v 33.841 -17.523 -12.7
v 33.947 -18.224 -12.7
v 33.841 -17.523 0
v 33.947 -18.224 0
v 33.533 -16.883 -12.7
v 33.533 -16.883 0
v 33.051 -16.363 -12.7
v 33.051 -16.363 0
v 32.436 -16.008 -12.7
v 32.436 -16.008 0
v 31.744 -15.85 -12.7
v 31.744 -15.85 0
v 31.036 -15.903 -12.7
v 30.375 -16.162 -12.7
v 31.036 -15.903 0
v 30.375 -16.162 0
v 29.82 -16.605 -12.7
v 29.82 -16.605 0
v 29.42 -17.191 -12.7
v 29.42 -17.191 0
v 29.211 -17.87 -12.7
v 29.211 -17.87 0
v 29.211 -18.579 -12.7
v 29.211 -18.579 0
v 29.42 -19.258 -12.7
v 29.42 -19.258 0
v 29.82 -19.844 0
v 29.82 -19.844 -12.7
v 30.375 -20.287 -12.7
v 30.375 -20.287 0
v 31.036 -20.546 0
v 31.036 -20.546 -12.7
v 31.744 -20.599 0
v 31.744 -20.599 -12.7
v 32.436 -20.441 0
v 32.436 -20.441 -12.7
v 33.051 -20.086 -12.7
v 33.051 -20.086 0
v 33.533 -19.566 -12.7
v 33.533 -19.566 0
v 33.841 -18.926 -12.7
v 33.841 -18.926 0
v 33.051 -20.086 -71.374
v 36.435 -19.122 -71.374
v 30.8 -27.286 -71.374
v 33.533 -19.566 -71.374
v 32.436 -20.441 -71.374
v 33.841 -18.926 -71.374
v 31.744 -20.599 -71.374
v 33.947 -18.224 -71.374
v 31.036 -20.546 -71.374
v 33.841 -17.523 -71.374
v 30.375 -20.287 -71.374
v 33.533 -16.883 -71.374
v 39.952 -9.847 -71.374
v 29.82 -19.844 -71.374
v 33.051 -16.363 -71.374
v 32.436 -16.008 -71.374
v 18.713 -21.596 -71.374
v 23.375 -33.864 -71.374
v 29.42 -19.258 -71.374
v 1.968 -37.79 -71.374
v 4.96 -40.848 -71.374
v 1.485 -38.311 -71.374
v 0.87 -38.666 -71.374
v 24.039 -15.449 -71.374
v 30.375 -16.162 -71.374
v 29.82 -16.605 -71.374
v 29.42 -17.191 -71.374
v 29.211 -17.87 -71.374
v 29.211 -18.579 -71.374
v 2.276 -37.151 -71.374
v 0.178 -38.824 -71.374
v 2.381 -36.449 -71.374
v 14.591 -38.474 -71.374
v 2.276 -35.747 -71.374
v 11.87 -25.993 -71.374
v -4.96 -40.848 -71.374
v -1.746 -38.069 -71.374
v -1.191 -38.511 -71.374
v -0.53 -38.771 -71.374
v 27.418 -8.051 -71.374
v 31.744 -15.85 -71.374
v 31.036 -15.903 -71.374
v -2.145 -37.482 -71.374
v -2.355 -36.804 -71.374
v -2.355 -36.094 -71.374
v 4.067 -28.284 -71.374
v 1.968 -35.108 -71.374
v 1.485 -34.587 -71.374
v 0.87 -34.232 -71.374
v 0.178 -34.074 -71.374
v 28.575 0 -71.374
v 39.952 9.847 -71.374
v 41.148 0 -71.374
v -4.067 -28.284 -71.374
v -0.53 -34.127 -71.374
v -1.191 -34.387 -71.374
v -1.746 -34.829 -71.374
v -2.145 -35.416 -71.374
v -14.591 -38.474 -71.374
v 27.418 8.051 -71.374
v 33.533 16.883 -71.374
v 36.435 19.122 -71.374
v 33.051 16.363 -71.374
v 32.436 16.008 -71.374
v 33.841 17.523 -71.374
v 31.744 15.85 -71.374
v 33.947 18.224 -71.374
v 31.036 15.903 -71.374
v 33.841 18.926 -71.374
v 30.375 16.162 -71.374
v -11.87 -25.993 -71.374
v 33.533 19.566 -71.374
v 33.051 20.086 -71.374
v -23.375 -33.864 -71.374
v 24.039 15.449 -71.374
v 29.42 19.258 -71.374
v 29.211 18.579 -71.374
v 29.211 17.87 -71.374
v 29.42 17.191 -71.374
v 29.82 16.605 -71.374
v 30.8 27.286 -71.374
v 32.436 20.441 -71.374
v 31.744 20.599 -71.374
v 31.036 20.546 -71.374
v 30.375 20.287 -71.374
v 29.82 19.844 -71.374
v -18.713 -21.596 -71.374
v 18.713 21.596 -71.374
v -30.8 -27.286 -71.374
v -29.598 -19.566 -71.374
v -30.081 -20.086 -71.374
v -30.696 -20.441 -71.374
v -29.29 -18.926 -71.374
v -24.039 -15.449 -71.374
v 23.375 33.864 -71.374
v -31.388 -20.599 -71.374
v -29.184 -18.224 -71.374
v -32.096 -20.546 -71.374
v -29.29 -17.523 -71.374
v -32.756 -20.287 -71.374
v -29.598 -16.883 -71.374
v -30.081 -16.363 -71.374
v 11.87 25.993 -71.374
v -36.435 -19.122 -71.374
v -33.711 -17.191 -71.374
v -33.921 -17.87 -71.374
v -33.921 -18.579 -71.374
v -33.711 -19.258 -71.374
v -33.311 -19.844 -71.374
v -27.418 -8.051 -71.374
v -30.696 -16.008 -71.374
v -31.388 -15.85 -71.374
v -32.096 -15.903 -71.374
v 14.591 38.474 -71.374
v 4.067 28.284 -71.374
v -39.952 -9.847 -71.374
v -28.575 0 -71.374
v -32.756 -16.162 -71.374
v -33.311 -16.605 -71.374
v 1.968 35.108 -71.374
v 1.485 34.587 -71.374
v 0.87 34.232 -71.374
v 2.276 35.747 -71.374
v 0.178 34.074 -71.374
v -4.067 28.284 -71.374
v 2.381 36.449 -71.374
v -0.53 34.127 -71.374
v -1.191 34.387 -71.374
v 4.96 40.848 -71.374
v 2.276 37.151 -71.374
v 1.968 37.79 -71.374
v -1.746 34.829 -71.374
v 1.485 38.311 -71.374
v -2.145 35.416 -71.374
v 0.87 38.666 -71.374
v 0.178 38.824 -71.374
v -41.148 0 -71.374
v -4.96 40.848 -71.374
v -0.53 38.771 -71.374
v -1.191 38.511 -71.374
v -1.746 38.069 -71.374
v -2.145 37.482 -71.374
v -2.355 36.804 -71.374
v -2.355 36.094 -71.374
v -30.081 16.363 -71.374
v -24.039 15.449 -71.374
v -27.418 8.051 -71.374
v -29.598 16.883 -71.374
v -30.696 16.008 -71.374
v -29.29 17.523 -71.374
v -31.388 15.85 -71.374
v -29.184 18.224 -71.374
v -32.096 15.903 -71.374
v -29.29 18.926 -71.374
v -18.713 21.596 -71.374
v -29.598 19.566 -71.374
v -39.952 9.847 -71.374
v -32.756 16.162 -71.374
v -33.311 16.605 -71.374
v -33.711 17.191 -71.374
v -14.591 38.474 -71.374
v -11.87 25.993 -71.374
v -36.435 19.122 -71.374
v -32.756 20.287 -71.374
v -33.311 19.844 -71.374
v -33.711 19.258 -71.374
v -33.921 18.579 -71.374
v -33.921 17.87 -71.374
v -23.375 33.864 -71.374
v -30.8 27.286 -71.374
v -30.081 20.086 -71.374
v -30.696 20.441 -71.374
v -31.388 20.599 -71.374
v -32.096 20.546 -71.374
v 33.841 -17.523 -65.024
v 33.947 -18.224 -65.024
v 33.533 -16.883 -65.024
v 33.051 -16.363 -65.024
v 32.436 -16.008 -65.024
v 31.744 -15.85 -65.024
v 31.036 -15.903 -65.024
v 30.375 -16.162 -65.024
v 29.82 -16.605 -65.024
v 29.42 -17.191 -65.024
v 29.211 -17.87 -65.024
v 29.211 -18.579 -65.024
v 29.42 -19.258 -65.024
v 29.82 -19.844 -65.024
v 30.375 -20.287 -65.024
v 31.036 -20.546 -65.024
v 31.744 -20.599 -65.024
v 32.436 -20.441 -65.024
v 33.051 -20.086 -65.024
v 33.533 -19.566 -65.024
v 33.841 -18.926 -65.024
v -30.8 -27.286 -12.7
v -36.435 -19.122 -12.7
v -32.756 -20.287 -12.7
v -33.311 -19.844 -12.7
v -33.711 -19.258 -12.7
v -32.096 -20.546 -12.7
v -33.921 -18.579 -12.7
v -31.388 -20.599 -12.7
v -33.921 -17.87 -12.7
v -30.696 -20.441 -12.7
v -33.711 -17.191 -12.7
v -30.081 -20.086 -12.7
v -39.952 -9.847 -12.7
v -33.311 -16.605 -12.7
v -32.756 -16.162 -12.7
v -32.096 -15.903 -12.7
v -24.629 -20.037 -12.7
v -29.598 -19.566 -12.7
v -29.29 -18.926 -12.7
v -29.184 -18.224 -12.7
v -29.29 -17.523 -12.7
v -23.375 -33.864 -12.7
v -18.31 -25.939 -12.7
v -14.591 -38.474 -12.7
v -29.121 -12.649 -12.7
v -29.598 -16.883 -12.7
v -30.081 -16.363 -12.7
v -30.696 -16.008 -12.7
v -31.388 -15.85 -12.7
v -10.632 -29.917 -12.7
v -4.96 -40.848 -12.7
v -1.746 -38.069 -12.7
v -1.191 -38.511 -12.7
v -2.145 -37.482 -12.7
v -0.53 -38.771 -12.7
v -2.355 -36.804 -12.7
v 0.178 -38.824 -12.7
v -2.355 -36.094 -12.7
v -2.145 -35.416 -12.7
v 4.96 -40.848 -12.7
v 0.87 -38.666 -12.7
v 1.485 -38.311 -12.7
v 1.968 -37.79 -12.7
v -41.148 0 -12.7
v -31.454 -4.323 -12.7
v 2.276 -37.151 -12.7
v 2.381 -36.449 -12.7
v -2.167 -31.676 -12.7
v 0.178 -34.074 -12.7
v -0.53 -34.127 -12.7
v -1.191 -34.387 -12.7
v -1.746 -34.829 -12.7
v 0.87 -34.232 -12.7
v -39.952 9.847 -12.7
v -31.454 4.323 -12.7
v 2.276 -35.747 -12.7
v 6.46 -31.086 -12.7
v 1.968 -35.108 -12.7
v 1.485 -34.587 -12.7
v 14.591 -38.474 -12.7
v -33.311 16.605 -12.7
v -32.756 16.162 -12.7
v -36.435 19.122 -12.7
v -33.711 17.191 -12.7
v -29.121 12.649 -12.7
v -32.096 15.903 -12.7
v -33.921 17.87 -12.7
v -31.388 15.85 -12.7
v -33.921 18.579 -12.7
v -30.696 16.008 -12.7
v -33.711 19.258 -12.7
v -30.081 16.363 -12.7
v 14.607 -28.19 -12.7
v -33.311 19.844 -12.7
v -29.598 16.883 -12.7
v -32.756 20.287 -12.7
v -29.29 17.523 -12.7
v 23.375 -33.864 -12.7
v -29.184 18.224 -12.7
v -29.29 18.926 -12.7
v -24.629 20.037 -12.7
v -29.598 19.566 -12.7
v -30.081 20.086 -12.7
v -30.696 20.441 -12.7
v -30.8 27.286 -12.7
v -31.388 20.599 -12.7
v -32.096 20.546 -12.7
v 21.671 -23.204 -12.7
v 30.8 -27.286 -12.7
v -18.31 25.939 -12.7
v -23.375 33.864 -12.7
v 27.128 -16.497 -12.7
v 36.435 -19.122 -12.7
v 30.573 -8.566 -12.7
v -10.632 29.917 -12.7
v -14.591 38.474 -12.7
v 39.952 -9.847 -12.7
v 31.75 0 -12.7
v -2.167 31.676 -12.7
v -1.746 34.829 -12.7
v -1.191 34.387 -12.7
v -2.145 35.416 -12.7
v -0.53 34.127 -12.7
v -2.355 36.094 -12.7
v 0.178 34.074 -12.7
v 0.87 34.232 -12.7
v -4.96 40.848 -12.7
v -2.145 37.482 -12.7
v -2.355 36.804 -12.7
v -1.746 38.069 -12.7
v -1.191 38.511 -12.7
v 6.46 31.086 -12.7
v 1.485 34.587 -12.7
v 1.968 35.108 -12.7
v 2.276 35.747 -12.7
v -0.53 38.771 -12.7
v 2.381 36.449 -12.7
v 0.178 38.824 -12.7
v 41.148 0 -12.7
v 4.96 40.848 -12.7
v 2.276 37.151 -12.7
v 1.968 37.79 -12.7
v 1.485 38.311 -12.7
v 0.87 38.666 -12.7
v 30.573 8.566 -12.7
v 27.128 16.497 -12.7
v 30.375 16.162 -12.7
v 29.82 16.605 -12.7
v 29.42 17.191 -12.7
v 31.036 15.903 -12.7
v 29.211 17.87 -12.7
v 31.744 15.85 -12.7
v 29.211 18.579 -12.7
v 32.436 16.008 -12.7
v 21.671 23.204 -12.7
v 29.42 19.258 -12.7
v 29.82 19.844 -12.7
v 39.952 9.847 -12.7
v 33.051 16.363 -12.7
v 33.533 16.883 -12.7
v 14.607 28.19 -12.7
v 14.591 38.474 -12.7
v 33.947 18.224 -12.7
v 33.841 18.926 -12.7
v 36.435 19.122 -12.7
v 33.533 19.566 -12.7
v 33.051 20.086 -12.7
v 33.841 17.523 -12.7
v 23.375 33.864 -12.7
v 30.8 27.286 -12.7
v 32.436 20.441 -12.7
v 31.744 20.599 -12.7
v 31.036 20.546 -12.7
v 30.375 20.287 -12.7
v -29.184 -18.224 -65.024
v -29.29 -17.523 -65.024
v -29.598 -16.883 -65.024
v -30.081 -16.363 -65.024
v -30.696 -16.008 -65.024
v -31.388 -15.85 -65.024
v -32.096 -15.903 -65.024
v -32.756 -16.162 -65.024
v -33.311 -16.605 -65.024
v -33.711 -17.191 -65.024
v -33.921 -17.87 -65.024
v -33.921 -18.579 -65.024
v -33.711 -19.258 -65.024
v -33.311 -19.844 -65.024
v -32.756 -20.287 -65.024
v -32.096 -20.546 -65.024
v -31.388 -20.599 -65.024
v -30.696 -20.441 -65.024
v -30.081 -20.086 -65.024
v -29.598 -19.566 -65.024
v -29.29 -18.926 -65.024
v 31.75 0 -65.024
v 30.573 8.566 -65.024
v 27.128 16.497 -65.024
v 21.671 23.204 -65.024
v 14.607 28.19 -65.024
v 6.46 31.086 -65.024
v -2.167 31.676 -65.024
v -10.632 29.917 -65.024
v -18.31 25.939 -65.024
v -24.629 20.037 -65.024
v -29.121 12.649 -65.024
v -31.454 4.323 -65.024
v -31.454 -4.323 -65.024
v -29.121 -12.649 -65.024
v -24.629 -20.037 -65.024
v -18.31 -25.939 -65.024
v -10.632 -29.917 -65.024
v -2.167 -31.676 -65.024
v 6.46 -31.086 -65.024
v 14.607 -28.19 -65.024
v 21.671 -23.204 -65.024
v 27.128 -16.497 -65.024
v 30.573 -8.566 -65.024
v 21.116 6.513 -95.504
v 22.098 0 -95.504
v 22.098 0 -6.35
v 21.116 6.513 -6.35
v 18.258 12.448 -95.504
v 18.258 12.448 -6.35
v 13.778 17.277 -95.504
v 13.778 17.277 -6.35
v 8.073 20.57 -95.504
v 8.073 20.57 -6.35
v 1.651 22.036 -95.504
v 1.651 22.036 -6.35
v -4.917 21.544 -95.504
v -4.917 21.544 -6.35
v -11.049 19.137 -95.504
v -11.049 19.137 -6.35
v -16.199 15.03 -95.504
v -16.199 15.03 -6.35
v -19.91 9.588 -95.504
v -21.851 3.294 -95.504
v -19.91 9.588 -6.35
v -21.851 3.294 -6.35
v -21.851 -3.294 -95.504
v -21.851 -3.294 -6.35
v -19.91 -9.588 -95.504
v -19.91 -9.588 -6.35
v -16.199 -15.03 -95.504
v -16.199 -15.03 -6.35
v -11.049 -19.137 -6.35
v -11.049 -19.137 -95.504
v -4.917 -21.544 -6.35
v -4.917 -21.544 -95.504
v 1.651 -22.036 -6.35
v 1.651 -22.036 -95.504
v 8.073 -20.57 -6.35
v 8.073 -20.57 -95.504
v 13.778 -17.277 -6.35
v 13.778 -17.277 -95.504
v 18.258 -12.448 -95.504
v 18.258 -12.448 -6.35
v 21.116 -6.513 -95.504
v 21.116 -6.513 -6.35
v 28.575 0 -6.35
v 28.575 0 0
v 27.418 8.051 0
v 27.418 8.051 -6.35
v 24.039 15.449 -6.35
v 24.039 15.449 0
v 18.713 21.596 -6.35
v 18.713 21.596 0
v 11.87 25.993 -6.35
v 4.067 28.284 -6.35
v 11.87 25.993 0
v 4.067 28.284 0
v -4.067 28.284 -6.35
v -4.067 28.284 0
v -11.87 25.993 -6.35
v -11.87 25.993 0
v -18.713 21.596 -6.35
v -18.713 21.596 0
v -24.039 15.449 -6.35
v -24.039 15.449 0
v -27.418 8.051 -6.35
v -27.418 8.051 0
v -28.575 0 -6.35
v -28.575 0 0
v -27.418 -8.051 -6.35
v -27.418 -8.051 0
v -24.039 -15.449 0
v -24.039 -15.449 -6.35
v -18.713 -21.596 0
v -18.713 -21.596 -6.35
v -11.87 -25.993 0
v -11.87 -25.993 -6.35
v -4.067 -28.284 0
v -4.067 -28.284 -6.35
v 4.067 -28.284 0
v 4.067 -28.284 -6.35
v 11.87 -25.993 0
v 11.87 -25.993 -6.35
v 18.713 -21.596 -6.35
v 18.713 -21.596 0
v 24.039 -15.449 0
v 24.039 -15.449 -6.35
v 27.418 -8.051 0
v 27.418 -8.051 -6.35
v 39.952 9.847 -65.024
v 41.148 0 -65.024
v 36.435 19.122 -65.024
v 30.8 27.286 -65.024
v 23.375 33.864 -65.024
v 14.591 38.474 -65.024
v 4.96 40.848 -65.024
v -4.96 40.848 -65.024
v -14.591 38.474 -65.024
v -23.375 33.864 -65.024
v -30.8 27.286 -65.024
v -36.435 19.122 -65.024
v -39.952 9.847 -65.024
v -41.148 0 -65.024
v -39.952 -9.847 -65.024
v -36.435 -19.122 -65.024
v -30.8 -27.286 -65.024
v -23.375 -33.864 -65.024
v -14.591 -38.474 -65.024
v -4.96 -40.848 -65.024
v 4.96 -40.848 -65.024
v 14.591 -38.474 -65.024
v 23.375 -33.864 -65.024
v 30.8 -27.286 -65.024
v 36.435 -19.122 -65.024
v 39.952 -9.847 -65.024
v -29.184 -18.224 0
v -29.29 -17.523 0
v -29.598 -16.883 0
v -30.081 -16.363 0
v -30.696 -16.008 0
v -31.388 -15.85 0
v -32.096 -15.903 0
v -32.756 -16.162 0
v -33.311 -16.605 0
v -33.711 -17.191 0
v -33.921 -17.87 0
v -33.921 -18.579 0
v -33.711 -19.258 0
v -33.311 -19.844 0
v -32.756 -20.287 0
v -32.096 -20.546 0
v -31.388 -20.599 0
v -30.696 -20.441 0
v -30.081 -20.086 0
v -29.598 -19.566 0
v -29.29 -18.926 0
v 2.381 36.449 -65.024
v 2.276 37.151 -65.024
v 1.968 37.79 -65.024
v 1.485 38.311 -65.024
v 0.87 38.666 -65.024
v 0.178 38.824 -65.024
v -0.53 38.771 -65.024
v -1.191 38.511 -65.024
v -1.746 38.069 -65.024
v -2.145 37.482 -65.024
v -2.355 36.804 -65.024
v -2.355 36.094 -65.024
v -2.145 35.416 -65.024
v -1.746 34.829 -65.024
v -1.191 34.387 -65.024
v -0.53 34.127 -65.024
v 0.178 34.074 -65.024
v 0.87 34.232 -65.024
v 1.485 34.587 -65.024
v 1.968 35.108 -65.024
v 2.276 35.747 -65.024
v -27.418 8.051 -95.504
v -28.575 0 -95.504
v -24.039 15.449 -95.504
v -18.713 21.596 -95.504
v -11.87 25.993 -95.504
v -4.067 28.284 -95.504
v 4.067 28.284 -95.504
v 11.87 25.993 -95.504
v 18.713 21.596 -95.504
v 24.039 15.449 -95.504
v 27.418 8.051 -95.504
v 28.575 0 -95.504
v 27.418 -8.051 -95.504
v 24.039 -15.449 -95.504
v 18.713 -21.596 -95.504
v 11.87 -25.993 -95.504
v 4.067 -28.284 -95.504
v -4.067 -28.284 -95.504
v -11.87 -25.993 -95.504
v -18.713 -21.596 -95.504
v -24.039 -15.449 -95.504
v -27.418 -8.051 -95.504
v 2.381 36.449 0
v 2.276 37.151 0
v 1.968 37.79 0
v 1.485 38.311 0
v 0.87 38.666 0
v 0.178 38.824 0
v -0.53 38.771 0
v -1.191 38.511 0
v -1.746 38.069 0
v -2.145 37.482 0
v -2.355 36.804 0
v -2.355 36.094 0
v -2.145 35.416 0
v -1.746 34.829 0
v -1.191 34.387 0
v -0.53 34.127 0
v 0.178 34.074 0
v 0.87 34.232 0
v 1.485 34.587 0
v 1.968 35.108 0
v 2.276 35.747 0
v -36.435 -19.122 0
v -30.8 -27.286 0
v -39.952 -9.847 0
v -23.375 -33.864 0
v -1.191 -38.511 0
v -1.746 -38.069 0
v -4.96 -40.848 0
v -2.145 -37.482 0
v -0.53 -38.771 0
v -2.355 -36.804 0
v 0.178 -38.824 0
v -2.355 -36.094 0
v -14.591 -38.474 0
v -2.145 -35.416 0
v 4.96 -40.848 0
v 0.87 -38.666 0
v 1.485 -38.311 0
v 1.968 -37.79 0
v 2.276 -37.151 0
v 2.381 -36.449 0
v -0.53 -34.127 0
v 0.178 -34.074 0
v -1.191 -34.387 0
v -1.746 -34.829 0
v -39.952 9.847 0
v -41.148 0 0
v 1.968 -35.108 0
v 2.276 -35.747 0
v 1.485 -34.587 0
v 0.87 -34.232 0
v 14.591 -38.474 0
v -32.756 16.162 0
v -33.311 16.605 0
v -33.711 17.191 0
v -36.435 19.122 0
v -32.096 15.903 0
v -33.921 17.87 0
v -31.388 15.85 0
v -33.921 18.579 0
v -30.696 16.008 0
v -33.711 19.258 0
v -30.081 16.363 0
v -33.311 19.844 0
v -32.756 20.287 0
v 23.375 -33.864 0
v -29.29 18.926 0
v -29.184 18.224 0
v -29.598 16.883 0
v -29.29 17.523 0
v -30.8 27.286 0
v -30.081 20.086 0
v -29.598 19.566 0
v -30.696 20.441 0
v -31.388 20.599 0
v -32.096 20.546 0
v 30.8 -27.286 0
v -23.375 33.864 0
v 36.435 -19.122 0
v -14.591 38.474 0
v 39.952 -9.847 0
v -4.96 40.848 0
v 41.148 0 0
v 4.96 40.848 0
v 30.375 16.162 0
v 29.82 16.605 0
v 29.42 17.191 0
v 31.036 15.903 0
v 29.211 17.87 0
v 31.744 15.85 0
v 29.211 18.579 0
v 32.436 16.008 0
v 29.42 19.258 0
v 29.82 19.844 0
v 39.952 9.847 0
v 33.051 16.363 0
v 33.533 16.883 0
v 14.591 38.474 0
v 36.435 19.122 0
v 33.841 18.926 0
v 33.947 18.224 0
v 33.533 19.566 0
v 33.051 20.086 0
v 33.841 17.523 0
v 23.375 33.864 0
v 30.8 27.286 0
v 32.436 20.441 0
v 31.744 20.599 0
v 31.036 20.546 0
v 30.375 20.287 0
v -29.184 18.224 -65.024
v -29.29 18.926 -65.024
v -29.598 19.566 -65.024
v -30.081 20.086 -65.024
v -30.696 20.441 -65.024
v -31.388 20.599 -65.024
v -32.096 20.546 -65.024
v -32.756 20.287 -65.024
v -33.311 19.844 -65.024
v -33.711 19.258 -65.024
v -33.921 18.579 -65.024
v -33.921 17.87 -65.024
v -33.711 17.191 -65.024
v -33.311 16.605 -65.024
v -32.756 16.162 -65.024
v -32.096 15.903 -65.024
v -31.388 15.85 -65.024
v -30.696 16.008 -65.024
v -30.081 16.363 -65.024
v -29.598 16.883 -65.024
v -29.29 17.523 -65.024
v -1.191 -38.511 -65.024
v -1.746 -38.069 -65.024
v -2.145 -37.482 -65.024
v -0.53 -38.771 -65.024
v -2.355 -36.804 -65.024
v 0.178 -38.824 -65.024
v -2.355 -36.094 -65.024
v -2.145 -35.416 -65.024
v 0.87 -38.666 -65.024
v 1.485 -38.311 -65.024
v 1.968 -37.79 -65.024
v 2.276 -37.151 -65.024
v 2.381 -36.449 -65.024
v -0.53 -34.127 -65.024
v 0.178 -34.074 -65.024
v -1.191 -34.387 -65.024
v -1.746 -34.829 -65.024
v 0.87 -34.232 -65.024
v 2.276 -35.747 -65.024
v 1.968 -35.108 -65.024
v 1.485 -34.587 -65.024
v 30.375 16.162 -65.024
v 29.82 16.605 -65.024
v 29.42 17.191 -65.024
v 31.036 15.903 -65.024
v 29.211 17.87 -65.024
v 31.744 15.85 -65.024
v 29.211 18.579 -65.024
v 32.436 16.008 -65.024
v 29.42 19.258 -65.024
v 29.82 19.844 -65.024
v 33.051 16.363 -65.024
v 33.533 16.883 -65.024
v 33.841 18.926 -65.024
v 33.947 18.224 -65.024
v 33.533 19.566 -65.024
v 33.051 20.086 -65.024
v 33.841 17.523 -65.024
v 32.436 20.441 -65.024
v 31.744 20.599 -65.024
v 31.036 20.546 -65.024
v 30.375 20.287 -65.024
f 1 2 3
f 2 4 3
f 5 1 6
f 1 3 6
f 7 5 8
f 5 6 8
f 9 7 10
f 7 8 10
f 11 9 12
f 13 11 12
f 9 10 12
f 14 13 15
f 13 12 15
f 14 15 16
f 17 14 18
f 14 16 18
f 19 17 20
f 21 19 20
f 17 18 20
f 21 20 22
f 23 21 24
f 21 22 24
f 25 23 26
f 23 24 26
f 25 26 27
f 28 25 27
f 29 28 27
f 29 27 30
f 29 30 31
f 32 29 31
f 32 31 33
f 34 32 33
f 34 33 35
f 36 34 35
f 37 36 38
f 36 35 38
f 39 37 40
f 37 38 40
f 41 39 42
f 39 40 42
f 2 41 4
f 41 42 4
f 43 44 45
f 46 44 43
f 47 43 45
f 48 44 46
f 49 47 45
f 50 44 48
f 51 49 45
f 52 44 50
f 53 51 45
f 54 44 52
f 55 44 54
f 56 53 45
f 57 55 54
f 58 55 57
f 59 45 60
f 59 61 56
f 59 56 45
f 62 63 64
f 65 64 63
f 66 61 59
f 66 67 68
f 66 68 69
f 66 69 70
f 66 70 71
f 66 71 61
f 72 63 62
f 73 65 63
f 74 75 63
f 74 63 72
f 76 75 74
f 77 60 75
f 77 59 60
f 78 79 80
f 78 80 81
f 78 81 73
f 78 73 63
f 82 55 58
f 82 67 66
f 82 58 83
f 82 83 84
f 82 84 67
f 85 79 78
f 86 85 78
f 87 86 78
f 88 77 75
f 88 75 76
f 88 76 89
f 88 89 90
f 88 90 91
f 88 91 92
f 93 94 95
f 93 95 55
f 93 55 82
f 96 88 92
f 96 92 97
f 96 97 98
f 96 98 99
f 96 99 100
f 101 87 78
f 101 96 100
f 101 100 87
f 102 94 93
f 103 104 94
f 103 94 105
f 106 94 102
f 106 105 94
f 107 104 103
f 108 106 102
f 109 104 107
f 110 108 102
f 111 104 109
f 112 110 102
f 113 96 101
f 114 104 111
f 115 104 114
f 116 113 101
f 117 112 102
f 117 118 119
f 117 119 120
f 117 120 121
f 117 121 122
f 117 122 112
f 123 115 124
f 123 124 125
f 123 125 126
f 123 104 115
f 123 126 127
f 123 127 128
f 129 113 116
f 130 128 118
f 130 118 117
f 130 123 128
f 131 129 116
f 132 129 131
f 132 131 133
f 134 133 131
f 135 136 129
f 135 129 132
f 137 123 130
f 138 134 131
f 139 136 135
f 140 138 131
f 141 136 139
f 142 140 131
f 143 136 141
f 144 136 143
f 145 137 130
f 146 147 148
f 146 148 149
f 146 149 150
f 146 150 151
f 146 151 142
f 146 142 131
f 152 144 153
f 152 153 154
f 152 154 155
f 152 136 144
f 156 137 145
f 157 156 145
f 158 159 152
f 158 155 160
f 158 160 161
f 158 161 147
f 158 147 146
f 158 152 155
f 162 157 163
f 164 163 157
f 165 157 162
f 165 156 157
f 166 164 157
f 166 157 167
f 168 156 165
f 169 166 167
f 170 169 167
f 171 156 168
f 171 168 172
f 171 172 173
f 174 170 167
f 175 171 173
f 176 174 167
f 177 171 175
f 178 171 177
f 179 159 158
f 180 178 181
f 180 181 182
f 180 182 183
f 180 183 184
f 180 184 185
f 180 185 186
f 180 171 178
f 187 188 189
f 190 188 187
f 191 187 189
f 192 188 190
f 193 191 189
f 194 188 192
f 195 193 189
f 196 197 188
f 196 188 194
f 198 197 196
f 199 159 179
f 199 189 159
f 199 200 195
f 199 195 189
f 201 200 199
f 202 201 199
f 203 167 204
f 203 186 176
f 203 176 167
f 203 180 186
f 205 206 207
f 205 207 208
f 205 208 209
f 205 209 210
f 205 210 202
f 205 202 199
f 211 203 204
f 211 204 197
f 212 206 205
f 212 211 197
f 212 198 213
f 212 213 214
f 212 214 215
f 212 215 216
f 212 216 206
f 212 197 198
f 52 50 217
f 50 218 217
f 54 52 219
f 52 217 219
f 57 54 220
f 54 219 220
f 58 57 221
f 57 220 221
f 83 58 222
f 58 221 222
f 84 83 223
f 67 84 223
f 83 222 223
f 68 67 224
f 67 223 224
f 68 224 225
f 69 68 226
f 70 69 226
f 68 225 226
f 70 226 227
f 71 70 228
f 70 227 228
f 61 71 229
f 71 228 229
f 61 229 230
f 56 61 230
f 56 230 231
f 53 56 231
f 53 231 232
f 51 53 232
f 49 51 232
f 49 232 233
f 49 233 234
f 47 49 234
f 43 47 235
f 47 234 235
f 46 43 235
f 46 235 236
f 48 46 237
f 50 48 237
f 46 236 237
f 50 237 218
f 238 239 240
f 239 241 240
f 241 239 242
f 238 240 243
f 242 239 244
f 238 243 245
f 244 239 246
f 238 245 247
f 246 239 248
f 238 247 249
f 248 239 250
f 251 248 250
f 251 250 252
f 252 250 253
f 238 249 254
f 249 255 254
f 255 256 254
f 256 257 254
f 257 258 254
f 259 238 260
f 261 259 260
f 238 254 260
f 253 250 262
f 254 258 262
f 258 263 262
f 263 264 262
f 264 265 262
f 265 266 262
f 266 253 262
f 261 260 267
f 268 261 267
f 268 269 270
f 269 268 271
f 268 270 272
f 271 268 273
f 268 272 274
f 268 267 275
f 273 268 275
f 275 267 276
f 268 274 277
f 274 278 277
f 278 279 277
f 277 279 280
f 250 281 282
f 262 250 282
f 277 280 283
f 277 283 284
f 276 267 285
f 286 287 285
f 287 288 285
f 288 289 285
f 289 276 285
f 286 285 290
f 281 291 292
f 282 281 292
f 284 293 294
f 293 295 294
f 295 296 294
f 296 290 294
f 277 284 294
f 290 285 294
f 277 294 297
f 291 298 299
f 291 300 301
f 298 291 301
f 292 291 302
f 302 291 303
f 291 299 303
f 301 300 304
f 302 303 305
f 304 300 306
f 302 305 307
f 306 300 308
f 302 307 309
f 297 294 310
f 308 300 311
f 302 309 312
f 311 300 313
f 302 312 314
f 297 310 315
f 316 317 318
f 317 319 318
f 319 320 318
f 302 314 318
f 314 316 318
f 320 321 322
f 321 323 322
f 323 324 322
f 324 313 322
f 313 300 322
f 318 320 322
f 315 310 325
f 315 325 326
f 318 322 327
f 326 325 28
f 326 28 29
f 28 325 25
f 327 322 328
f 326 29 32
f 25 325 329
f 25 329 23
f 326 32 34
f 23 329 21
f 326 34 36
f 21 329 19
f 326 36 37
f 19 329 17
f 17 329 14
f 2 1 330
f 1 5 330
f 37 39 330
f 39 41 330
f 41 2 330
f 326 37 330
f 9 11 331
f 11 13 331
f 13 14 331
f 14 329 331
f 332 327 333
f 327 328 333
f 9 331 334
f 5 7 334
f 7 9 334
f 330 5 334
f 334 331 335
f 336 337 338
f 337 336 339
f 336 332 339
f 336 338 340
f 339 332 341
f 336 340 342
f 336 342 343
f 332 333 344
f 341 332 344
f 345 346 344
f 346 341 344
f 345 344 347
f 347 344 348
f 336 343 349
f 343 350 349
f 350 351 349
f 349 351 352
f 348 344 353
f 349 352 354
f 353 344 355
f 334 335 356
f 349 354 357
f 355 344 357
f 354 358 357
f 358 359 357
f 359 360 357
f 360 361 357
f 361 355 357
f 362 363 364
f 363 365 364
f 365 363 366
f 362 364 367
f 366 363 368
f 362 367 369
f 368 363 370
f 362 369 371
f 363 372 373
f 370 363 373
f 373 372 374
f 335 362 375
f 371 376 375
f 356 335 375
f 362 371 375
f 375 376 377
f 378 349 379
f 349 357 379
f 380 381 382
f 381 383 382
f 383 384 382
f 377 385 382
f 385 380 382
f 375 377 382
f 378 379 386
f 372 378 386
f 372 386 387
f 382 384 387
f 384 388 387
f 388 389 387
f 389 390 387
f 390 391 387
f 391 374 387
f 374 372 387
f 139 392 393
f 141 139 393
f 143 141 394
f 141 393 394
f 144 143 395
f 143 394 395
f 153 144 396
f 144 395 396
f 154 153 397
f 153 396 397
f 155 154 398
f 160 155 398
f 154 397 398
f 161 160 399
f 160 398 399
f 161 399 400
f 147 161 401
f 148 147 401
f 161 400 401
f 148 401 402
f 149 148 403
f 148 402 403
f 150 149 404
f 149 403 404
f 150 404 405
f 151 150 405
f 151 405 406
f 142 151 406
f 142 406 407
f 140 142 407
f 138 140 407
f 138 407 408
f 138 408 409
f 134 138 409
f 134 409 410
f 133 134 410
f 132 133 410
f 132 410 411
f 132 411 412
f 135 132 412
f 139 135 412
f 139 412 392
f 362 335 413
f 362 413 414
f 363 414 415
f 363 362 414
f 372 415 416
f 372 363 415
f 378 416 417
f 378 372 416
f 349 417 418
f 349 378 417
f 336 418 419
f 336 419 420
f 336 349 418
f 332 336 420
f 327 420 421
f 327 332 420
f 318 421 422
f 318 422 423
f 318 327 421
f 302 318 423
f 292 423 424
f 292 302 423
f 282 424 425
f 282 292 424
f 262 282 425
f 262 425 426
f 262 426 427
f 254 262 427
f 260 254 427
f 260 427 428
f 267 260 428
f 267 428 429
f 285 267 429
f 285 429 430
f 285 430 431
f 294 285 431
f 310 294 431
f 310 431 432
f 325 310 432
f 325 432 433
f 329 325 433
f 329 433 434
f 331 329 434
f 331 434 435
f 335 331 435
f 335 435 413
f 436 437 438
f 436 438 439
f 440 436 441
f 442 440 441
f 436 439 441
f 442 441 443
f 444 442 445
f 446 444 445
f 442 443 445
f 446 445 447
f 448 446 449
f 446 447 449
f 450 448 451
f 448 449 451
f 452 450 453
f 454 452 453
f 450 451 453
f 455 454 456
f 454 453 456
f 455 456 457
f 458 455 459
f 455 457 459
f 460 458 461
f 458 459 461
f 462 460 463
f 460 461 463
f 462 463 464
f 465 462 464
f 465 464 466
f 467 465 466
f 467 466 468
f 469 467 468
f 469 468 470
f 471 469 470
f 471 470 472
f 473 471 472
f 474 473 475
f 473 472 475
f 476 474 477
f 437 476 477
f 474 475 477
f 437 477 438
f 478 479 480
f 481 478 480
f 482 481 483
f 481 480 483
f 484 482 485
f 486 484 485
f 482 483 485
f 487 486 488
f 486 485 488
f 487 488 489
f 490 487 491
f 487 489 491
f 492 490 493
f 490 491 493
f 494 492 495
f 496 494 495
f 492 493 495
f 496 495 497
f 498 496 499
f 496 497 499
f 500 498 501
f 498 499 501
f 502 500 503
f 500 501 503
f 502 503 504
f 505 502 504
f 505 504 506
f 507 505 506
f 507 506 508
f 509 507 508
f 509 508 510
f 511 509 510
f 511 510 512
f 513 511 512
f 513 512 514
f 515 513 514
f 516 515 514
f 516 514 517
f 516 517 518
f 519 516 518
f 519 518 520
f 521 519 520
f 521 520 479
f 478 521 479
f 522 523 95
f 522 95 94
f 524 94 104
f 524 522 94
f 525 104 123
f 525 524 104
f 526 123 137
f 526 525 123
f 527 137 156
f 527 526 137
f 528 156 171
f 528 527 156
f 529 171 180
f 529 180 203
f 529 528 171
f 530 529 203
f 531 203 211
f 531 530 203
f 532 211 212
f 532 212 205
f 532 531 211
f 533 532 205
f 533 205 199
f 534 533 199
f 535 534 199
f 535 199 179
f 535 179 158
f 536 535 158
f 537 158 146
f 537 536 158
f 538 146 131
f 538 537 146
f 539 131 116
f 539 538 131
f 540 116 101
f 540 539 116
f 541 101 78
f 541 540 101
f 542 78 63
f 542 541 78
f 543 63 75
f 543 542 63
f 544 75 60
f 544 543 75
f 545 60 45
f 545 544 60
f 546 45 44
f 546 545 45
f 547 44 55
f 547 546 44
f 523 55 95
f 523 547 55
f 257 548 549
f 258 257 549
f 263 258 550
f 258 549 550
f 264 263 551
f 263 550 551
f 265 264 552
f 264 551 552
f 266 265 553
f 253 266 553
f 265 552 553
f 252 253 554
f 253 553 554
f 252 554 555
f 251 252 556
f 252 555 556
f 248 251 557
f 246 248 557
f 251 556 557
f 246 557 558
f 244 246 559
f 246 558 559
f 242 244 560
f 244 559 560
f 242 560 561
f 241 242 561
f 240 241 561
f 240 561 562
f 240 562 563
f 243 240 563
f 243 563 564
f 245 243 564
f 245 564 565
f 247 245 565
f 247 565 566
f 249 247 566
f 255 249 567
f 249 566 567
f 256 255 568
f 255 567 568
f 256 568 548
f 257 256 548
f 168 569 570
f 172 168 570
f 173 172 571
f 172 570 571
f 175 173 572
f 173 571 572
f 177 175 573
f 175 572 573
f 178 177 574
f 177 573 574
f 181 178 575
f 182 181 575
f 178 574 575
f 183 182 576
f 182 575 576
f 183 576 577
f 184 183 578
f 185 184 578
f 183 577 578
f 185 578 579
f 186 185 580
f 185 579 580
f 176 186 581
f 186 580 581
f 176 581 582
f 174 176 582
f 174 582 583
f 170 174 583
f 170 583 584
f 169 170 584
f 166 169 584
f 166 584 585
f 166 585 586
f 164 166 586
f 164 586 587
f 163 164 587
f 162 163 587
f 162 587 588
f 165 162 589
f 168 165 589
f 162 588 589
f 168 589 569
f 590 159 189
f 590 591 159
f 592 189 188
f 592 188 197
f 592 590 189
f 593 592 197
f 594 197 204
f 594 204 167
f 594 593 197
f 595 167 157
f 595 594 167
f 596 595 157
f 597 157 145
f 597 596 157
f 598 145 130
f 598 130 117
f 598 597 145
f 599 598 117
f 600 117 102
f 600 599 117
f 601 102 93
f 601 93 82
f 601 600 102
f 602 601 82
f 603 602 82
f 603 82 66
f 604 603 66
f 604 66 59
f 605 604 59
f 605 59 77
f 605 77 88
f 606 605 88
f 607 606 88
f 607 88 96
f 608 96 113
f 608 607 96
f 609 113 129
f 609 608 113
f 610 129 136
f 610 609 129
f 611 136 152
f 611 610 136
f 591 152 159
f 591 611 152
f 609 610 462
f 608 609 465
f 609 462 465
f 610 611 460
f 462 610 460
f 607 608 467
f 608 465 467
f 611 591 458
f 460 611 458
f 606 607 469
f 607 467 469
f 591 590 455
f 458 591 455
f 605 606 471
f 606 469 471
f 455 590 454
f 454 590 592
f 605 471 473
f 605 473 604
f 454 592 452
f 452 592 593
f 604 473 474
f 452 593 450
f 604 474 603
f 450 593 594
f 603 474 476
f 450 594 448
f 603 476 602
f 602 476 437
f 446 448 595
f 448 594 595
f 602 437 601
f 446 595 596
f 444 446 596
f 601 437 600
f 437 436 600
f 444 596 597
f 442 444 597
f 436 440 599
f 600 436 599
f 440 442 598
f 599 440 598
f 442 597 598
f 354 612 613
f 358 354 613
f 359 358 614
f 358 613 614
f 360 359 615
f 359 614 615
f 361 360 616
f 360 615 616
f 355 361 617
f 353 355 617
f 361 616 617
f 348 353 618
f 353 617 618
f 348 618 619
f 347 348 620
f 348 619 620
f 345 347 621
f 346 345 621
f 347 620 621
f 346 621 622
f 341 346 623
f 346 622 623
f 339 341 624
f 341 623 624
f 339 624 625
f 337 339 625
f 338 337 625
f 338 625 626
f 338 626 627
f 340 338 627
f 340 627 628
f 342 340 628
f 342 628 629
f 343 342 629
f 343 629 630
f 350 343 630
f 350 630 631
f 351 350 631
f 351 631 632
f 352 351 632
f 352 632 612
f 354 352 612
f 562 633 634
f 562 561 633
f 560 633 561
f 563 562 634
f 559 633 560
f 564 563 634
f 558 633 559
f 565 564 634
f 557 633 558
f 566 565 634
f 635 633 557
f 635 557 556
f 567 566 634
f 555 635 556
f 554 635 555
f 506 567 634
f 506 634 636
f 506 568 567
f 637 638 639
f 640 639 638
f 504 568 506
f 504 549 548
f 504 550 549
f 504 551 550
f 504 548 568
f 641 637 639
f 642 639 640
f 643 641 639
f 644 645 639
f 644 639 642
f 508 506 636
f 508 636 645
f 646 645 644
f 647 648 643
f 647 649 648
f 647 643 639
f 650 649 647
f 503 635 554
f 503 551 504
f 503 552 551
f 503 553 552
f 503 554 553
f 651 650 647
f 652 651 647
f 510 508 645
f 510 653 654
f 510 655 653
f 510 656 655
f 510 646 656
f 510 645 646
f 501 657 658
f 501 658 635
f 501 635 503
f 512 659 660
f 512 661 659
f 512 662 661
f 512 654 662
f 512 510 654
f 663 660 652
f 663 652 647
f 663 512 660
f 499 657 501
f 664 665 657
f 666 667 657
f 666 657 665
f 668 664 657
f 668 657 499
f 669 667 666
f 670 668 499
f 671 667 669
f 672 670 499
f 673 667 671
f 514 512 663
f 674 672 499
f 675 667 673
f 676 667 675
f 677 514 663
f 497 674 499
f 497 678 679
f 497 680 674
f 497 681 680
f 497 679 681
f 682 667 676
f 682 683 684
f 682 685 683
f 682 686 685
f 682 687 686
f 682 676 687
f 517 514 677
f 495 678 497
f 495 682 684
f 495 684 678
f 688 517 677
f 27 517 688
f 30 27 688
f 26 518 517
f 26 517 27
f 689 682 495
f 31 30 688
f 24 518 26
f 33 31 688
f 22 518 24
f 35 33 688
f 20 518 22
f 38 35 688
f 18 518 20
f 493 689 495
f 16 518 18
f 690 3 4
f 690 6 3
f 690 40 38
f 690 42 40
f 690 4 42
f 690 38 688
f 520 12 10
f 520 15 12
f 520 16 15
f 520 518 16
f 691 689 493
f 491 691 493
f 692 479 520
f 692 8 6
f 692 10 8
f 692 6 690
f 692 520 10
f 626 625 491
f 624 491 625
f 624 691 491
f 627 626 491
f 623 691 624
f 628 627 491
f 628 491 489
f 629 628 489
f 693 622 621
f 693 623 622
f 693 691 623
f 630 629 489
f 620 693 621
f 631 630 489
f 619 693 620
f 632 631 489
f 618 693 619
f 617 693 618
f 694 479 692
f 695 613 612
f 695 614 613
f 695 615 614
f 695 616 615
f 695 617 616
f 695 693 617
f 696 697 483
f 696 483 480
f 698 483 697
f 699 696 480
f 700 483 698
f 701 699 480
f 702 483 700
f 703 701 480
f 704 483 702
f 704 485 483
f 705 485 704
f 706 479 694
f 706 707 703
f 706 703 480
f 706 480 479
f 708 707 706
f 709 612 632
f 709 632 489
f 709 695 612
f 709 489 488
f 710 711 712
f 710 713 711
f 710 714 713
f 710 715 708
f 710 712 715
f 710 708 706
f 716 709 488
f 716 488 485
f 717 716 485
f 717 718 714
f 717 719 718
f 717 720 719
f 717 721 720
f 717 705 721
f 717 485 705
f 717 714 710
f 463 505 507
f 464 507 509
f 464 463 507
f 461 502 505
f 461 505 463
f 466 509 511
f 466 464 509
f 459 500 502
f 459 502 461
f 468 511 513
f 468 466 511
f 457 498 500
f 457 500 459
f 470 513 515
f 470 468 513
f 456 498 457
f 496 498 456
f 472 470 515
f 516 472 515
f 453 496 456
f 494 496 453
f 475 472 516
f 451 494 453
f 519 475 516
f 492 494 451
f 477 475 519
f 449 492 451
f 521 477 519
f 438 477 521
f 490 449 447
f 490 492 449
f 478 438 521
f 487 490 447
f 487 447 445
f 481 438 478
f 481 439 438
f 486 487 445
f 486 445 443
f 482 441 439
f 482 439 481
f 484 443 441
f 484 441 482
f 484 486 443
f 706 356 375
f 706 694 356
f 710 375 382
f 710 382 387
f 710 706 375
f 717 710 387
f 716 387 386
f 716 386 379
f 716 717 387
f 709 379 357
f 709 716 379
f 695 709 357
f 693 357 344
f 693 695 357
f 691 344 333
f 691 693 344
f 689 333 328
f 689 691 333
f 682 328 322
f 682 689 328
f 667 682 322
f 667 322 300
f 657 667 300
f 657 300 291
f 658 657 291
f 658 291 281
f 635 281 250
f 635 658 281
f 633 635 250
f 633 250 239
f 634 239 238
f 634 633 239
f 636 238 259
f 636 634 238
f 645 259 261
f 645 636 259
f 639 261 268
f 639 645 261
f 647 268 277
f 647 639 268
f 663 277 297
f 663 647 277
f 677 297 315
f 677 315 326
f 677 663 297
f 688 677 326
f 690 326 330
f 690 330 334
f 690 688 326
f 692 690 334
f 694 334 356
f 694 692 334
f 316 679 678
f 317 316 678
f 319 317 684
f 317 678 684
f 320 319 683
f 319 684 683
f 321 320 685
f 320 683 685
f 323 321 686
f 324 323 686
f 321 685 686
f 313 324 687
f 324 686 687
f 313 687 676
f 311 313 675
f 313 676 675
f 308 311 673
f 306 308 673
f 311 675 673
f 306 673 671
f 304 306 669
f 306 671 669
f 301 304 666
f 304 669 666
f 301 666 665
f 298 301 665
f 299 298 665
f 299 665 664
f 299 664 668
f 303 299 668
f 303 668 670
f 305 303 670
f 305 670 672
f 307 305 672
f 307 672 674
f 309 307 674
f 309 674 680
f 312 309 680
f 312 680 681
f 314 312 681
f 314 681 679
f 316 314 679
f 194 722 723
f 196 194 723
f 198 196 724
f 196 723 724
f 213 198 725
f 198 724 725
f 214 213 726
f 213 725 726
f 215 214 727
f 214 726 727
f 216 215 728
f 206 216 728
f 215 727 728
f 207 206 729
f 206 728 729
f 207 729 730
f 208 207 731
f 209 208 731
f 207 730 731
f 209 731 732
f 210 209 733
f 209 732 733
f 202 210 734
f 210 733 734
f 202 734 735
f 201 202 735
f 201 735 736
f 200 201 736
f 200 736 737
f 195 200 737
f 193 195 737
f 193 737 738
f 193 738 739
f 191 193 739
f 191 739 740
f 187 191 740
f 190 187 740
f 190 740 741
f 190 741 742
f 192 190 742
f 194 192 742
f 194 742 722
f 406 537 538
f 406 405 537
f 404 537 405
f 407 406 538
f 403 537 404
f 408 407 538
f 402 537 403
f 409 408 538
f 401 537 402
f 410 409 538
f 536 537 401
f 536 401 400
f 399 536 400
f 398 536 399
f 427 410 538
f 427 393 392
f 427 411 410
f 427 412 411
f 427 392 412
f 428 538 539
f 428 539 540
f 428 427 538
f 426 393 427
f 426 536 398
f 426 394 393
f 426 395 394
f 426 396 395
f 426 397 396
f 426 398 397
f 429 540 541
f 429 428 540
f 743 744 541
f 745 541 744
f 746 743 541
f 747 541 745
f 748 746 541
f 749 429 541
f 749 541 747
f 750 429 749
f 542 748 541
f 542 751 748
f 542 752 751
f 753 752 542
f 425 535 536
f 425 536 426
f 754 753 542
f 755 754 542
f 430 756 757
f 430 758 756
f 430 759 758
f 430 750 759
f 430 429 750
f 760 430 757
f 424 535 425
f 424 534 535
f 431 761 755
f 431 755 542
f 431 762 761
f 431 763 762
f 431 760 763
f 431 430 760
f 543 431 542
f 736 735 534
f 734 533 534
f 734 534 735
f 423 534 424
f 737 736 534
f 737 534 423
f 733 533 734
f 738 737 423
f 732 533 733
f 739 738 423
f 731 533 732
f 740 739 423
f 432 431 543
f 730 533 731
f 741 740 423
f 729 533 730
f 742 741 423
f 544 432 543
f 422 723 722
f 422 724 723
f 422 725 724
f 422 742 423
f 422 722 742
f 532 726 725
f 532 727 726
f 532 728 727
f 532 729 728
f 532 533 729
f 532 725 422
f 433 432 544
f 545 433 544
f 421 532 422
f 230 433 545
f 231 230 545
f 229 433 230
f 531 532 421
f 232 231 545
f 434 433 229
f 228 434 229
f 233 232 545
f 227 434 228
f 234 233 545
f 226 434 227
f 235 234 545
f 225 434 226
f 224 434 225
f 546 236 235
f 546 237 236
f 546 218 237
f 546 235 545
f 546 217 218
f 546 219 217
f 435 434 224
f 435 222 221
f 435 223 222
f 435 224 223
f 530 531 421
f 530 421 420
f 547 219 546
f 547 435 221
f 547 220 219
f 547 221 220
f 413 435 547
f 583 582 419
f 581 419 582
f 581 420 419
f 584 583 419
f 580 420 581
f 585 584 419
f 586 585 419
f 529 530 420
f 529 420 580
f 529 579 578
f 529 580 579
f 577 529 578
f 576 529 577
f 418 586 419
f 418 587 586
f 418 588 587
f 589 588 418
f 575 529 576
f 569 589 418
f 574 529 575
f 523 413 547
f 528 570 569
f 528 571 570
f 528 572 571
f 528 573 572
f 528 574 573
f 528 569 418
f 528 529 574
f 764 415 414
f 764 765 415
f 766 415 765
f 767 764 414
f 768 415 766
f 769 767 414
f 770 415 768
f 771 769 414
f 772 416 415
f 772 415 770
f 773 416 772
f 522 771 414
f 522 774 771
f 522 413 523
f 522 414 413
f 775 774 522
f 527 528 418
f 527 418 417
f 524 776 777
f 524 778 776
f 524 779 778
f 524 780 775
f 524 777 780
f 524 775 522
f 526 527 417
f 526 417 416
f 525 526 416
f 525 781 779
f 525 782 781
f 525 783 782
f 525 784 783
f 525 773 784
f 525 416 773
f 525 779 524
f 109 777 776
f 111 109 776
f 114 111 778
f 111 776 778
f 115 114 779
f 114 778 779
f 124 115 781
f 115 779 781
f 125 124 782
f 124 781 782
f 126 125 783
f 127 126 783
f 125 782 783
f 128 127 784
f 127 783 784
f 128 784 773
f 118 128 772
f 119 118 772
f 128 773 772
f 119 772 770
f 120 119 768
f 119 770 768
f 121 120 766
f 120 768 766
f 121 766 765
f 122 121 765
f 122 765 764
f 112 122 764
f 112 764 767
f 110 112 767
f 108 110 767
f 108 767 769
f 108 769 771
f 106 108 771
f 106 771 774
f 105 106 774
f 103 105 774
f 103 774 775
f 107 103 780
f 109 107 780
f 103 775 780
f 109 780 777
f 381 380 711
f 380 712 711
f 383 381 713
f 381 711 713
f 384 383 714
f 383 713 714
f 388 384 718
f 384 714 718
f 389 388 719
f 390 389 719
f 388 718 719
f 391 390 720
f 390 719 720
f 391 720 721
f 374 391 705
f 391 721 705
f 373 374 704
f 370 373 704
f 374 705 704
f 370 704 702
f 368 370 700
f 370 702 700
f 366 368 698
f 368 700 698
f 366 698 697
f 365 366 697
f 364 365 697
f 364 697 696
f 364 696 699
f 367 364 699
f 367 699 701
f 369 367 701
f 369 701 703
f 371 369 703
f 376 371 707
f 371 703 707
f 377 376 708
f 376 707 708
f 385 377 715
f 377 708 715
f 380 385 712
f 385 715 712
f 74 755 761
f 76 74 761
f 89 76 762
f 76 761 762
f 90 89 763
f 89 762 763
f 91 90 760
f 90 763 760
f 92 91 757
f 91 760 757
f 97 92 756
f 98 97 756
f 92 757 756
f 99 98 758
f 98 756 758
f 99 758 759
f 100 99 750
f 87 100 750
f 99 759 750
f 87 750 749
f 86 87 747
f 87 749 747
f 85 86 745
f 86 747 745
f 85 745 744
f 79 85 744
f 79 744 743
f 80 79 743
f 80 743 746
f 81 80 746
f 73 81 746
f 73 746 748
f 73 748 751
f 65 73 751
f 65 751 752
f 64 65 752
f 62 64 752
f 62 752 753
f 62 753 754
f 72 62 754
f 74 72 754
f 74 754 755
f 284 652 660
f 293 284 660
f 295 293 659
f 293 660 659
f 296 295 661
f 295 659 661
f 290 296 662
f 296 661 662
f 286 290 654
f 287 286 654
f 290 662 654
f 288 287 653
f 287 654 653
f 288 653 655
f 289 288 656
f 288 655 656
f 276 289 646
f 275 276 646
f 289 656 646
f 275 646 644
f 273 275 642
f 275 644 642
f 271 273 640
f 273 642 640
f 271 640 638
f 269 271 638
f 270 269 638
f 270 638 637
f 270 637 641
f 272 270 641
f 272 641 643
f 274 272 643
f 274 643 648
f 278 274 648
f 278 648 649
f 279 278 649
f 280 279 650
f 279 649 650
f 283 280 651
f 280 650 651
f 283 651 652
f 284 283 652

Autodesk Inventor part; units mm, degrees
ref_plane "YZ Plane" through (0, 0, 0) normal (1, 0, 0) x (0, 1, 0)
ref_plane "XZ Plane" through (0, 0, 0) normal (0, 1, 0) x (-1, 0, 0)
ref_plane "XY Plane" through (0, 0, 0) normal (0, 0, 1) x (1, 0, 0)
sketch "Sketch1" plane through (0, 0, 0) normal (0, 0, 1) x (1, 0, 0)
  circle A0 centre (0, 0) radius 41.148
  dimension "d0" = 82.296
extrude "Extrusion1" add sketch "Sketch1" against normal blind 95.504
sketch "Sketch2" plane through (0, 0, 0) normal (0, 0, 1) x (1, 0, 0)
  circle A0 centre (0, 0) radius 22.098
  dimension "d3" = 44.196
extrude "Extrusion2" cut sketch "Sketch2" against normal blind 95.504
sketch "Sketch3" plane through (0, 0, -95.504) normal (0, 0, -1) x (-1, 0, 0)
  circle A0 centre (0, 0) radius 41.148
  circle A1 centre (0, 0) radius 28.575
  dimension "d6" = 57.15
extrude "Extrusion3" cut sketch "Sketch3" against normal blind 24.13
sketch "Sketch4" plane through (0, 0, 0) normal (0, 0, 1) x (1, 0, 0)
  circle A0 centre (0, 0) radius 22.098
  circle A1 centre (0, 0) radius 28.575
  dimension "d9" = 57.15
extrude "Extrusion4" cut sketch "Sketch4" against normal blind 6.35
sketch "Sketch5" plane through (0, 0, 0) normal (0, 0, 1) x (1, 0, 0)
  circle A0 centre (0, 0) radius 41.148
  circle A1 centre (0, 0) radius 31.75
  dimension "d12" = 63.5
extrude "Extrusion5" cut sketch "Sketch5" against normal blind 65.024
sketch "Sketch6" plane through (0, 0, 0) normal (0, 0, 1) x (1, 0, 0)
  circle A0 centre (0, 0) radius 31.75
  circle A1 centre (0, 0) radius 41.148
extrude "Extrusion6" add sketch "Sketch6" against normal blind 12.7
sketch "Sketch7" plane through (0, 0, 0) normal (0, 0, 1) x (1, 0, 0)
  circle A0 centre (0, 36.449) radius 2.3813
  circle A1 centre (-31.5658, 18.2245) radius 2.3813
  circle A2 centre (-31.5658, -18.2245) radius 2.3813
  circle A3 centre (0, -36.449) radius 2.3813
  circle A4 centre (31.5658, -18.2245) radius 2.3813
  circle A5 centre (31.5658, 18.2245) radius 2.3813
  point P0 (0, 0)
  dimension "d17" = 4.7625
  dimension "d20" = 360
extrude "Extrusion7" cut sketch "Sketch7" against normal blind 152.4
properties part number "PostComb4_4"
